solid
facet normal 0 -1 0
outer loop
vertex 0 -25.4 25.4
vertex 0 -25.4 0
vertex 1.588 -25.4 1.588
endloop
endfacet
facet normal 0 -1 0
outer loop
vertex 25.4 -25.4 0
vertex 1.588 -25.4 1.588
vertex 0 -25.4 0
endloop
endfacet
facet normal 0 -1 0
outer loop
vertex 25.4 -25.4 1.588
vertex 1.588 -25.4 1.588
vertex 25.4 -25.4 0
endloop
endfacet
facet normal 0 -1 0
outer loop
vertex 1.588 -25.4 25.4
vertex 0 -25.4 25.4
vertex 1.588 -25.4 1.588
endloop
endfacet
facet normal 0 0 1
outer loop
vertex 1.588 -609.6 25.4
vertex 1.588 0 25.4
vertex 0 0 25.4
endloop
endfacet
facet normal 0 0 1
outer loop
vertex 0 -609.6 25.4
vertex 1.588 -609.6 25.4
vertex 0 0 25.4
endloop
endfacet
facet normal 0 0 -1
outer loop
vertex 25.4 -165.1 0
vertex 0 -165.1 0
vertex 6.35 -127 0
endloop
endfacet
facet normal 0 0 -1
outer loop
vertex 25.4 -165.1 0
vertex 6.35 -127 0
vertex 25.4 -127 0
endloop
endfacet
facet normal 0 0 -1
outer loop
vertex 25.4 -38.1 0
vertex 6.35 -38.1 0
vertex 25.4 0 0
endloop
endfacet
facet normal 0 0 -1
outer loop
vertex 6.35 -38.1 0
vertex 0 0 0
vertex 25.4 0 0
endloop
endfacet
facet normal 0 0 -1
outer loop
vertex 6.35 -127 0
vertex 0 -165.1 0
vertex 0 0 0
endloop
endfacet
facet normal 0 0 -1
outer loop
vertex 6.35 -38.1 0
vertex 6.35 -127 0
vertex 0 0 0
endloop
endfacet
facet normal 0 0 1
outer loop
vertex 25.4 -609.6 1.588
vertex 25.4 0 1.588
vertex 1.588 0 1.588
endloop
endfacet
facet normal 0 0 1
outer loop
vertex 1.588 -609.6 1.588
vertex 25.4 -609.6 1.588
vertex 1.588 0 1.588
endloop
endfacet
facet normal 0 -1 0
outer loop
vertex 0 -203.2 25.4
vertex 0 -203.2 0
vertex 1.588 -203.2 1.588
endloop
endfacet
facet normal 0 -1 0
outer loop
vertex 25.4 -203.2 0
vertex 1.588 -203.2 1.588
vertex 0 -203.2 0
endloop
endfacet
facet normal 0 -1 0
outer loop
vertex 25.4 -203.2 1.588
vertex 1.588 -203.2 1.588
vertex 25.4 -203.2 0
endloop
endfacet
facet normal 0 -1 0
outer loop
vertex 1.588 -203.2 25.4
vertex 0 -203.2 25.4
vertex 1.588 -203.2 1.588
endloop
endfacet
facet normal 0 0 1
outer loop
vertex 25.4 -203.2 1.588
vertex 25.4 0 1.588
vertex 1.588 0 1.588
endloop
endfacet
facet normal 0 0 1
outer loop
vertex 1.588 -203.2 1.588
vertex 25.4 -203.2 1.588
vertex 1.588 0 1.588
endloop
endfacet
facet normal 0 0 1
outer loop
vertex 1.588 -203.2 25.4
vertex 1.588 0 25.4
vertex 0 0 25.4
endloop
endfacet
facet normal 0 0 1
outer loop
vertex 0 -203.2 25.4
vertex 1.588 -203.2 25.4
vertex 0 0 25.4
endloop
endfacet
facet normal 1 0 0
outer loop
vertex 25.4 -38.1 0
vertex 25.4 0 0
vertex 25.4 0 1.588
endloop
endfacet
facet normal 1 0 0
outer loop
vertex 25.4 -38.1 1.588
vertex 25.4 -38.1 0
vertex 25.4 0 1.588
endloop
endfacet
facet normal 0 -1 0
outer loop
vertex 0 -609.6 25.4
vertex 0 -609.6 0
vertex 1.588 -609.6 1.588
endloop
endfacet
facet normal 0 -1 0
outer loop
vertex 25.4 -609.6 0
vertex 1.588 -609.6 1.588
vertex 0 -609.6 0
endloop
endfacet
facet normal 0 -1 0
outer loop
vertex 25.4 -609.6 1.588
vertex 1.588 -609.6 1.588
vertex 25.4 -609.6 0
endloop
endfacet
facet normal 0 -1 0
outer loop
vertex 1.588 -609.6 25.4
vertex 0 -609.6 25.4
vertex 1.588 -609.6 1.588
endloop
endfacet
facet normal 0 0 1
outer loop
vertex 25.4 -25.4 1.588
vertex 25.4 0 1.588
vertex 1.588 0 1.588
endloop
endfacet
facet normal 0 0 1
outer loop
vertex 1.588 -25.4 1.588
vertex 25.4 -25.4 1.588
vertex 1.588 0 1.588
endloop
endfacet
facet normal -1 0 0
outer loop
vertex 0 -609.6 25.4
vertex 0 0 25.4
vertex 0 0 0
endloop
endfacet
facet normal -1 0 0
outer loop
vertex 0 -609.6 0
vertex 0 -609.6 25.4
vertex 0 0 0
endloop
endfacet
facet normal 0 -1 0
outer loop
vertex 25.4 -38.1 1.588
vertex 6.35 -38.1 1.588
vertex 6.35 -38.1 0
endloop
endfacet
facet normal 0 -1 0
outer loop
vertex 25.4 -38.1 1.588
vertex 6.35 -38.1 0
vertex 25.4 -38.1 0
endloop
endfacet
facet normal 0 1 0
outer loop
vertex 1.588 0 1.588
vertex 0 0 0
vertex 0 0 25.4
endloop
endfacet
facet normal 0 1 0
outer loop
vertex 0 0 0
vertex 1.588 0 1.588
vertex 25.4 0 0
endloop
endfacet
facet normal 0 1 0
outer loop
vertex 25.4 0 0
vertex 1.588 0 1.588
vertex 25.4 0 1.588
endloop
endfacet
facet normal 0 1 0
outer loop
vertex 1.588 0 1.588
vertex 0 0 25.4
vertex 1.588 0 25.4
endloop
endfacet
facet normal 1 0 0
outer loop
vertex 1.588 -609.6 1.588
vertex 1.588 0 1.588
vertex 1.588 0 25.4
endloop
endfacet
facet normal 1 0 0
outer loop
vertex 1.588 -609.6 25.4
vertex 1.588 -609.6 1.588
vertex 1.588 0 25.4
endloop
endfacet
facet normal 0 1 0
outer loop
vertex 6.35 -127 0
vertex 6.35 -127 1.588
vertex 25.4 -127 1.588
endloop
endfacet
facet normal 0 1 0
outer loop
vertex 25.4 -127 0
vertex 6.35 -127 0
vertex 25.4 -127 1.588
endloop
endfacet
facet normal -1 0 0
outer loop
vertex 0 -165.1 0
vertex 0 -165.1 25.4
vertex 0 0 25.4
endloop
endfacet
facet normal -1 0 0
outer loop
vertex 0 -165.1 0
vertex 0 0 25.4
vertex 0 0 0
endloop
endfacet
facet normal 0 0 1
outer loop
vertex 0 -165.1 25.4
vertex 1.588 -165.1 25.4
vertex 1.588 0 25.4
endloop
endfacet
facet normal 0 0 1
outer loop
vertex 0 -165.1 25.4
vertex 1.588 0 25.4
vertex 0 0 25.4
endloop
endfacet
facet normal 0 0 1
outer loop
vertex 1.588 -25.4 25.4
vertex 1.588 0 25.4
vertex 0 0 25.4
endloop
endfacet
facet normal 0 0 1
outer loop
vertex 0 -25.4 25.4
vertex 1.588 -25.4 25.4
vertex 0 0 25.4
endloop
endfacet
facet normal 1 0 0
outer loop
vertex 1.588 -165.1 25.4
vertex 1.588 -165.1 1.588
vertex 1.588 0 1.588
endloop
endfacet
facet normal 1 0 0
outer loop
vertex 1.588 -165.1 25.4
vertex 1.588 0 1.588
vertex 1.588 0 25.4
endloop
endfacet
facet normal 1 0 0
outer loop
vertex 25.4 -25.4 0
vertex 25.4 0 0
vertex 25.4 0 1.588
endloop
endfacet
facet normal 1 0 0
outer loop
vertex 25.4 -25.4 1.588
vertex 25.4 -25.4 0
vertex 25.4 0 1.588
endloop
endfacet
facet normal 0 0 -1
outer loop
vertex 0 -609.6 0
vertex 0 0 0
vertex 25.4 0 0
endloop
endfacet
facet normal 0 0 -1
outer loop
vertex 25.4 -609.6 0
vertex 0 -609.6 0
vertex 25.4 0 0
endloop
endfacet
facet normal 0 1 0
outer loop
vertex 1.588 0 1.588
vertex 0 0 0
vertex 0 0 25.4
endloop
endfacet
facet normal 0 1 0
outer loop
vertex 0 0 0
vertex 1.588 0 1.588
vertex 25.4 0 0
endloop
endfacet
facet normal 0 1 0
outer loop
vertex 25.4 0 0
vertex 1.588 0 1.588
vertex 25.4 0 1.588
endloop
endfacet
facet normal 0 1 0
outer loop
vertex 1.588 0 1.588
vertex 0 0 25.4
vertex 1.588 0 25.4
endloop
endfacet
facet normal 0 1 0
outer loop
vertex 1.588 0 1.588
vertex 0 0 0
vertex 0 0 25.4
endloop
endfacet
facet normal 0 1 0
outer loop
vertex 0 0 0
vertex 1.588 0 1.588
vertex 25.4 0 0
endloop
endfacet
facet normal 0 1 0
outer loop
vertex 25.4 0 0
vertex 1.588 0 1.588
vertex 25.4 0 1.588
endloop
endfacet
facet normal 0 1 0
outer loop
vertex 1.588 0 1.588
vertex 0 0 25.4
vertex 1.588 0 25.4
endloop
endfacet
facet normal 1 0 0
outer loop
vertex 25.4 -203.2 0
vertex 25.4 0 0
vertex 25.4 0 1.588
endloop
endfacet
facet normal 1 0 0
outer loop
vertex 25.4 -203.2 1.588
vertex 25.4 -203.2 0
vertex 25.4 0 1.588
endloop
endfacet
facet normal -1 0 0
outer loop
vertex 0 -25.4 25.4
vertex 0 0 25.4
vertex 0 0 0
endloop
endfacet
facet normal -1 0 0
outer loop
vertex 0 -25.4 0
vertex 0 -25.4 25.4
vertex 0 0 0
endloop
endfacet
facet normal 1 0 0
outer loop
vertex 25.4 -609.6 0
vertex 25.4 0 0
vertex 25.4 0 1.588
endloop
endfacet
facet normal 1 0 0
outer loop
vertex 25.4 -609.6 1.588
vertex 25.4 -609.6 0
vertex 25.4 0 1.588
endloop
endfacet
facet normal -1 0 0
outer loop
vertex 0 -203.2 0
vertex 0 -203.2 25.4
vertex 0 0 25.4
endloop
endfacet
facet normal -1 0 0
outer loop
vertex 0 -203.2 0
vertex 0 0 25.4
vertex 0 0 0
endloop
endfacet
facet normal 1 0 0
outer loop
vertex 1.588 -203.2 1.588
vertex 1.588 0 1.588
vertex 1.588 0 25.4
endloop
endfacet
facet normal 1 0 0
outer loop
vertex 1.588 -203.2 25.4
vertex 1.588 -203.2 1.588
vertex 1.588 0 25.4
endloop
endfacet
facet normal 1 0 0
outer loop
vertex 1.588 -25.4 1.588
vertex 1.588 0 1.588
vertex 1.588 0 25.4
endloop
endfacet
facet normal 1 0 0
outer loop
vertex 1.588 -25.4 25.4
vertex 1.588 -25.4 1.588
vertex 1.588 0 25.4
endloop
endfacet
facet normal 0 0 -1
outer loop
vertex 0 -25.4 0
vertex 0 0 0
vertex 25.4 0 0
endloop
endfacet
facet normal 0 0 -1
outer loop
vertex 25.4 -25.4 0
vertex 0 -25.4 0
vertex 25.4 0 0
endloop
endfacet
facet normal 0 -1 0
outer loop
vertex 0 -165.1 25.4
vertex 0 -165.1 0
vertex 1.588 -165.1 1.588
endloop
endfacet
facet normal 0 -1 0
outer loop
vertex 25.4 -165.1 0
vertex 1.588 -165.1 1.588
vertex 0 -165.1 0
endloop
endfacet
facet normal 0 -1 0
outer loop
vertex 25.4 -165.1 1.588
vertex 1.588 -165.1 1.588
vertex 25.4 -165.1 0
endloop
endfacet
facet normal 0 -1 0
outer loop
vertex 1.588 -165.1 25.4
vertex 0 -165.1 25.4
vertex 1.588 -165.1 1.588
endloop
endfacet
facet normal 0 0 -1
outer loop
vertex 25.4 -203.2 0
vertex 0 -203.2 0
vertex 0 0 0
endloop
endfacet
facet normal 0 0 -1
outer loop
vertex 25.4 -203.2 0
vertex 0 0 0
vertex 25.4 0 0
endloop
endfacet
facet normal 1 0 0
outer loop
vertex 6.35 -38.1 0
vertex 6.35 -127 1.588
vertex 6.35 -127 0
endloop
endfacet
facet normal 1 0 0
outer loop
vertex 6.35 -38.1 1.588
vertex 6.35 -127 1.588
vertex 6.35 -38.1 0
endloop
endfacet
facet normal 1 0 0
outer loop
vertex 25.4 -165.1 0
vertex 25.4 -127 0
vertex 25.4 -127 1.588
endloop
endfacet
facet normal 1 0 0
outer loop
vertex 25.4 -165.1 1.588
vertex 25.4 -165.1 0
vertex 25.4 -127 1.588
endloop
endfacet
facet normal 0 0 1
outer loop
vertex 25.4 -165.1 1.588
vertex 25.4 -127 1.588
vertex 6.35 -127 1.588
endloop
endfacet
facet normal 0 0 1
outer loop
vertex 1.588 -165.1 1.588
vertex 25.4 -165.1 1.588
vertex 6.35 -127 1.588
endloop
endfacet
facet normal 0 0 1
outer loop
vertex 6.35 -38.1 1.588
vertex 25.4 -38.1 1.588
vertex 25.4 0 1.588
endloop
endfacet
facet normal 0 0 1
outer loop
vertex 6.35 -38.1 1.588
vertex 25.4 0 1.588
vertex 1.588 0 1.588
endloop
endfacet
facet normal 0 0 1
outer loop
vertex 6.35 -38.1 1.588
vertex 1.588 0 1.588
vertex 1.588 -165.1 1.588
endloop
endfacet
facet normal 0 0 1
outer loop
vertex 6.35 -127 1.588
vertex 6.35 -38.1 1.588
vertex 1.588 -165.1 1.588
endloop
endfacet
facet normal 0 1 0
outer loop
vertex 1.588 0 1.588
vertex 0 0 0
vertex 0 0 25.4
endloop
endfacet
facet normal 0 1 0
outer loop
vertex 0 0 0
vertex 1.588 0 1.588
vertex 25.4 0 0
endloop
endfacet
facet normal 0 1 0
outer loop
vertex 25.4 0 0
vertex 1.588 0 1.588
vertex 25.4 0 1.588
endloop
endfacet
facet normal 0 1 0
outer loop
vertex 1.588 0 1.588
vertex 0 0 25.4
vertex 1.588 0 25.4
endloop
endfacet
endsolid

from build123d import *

# Parameters (mm, degrees)
F1_DEPTH = 203.2
F2_DEPTH = 609.6
F3_DEPTH = 25.4
F4_DEPTH = 165.1
F5_W     = 19.05
F5_H     = 88.9
F6_DEPTH = 25.4
F7_DEPTH = 203.2


with BuildPart() as f1:
    # F0 (on Front) → F1 (new body)
    with BuildSketch(Plane.XZ):
        Polygon((0, 25.4), (0, 0), (25.4, 0), (25.4, 1.5875), (1.5875, 1.5875), (1.5875, 25.4), align=None)
    extrude(amount=F1_DEPTH)


with BuildPart() as f2:
    # F0 (on Front) → F2 (new body)
    with BuildSketch(Plane.XZ):
        Polygon((0, 25.4), (0, 0), (25.4, 0), (25.4, 1.5875), (1.5875, 1.5875), (1.5875, 25.4), align=None)
    extrude(amount=F2_DEPTH)


with BuildPart() as f3:
    # F0 (on Front) → F3 (new body)
    with BuildSketch(Plane.XZ):
        Polygon((0, 25.4), (0, 0), (25.4, 0), (25.4, 1.5875), (1.5875, 1.5875), (1.5875, 25.4), align=None)
    extrude(amount=F3_DEPTH)


with BuildPart() as f4:
    # F0 (on Front) → F4 (new body)
    with BuildSketch(Plane.XZ):
        Polygon((0, 25.4), (0, 0), (25.4, 0), (25.4, 1.5875), (1.5875, 1.5875), (1.5875, 25.4), align=None)
    extrude(amount=F4_DEPTH)

    # F5 (on face) → F6 (cut)
    with BuildSketch(Plane.XY.offset(1.5875)):
        with Locations((15.875, -82.55)):
            Rectangle(F5_W, F5_H)
    extrude(amount=-F6_DEPTH, mode=Mode.SUBTRACT)


with BuildPart() as f7:
    # F0 (on Front) → F7 (new body)
    with BuildSketch(Plane.XZ):
        Polygon((0, 25.4), (0, 0), (25.4, 0), (25.4, 1.5875), (1.5875, 1.5875), (1.5875, 25.4), align=None)
    extrude(amount=F7_DEPTH)


solid = Compound([f1.part, f2.part, f3.part, f4.part])
